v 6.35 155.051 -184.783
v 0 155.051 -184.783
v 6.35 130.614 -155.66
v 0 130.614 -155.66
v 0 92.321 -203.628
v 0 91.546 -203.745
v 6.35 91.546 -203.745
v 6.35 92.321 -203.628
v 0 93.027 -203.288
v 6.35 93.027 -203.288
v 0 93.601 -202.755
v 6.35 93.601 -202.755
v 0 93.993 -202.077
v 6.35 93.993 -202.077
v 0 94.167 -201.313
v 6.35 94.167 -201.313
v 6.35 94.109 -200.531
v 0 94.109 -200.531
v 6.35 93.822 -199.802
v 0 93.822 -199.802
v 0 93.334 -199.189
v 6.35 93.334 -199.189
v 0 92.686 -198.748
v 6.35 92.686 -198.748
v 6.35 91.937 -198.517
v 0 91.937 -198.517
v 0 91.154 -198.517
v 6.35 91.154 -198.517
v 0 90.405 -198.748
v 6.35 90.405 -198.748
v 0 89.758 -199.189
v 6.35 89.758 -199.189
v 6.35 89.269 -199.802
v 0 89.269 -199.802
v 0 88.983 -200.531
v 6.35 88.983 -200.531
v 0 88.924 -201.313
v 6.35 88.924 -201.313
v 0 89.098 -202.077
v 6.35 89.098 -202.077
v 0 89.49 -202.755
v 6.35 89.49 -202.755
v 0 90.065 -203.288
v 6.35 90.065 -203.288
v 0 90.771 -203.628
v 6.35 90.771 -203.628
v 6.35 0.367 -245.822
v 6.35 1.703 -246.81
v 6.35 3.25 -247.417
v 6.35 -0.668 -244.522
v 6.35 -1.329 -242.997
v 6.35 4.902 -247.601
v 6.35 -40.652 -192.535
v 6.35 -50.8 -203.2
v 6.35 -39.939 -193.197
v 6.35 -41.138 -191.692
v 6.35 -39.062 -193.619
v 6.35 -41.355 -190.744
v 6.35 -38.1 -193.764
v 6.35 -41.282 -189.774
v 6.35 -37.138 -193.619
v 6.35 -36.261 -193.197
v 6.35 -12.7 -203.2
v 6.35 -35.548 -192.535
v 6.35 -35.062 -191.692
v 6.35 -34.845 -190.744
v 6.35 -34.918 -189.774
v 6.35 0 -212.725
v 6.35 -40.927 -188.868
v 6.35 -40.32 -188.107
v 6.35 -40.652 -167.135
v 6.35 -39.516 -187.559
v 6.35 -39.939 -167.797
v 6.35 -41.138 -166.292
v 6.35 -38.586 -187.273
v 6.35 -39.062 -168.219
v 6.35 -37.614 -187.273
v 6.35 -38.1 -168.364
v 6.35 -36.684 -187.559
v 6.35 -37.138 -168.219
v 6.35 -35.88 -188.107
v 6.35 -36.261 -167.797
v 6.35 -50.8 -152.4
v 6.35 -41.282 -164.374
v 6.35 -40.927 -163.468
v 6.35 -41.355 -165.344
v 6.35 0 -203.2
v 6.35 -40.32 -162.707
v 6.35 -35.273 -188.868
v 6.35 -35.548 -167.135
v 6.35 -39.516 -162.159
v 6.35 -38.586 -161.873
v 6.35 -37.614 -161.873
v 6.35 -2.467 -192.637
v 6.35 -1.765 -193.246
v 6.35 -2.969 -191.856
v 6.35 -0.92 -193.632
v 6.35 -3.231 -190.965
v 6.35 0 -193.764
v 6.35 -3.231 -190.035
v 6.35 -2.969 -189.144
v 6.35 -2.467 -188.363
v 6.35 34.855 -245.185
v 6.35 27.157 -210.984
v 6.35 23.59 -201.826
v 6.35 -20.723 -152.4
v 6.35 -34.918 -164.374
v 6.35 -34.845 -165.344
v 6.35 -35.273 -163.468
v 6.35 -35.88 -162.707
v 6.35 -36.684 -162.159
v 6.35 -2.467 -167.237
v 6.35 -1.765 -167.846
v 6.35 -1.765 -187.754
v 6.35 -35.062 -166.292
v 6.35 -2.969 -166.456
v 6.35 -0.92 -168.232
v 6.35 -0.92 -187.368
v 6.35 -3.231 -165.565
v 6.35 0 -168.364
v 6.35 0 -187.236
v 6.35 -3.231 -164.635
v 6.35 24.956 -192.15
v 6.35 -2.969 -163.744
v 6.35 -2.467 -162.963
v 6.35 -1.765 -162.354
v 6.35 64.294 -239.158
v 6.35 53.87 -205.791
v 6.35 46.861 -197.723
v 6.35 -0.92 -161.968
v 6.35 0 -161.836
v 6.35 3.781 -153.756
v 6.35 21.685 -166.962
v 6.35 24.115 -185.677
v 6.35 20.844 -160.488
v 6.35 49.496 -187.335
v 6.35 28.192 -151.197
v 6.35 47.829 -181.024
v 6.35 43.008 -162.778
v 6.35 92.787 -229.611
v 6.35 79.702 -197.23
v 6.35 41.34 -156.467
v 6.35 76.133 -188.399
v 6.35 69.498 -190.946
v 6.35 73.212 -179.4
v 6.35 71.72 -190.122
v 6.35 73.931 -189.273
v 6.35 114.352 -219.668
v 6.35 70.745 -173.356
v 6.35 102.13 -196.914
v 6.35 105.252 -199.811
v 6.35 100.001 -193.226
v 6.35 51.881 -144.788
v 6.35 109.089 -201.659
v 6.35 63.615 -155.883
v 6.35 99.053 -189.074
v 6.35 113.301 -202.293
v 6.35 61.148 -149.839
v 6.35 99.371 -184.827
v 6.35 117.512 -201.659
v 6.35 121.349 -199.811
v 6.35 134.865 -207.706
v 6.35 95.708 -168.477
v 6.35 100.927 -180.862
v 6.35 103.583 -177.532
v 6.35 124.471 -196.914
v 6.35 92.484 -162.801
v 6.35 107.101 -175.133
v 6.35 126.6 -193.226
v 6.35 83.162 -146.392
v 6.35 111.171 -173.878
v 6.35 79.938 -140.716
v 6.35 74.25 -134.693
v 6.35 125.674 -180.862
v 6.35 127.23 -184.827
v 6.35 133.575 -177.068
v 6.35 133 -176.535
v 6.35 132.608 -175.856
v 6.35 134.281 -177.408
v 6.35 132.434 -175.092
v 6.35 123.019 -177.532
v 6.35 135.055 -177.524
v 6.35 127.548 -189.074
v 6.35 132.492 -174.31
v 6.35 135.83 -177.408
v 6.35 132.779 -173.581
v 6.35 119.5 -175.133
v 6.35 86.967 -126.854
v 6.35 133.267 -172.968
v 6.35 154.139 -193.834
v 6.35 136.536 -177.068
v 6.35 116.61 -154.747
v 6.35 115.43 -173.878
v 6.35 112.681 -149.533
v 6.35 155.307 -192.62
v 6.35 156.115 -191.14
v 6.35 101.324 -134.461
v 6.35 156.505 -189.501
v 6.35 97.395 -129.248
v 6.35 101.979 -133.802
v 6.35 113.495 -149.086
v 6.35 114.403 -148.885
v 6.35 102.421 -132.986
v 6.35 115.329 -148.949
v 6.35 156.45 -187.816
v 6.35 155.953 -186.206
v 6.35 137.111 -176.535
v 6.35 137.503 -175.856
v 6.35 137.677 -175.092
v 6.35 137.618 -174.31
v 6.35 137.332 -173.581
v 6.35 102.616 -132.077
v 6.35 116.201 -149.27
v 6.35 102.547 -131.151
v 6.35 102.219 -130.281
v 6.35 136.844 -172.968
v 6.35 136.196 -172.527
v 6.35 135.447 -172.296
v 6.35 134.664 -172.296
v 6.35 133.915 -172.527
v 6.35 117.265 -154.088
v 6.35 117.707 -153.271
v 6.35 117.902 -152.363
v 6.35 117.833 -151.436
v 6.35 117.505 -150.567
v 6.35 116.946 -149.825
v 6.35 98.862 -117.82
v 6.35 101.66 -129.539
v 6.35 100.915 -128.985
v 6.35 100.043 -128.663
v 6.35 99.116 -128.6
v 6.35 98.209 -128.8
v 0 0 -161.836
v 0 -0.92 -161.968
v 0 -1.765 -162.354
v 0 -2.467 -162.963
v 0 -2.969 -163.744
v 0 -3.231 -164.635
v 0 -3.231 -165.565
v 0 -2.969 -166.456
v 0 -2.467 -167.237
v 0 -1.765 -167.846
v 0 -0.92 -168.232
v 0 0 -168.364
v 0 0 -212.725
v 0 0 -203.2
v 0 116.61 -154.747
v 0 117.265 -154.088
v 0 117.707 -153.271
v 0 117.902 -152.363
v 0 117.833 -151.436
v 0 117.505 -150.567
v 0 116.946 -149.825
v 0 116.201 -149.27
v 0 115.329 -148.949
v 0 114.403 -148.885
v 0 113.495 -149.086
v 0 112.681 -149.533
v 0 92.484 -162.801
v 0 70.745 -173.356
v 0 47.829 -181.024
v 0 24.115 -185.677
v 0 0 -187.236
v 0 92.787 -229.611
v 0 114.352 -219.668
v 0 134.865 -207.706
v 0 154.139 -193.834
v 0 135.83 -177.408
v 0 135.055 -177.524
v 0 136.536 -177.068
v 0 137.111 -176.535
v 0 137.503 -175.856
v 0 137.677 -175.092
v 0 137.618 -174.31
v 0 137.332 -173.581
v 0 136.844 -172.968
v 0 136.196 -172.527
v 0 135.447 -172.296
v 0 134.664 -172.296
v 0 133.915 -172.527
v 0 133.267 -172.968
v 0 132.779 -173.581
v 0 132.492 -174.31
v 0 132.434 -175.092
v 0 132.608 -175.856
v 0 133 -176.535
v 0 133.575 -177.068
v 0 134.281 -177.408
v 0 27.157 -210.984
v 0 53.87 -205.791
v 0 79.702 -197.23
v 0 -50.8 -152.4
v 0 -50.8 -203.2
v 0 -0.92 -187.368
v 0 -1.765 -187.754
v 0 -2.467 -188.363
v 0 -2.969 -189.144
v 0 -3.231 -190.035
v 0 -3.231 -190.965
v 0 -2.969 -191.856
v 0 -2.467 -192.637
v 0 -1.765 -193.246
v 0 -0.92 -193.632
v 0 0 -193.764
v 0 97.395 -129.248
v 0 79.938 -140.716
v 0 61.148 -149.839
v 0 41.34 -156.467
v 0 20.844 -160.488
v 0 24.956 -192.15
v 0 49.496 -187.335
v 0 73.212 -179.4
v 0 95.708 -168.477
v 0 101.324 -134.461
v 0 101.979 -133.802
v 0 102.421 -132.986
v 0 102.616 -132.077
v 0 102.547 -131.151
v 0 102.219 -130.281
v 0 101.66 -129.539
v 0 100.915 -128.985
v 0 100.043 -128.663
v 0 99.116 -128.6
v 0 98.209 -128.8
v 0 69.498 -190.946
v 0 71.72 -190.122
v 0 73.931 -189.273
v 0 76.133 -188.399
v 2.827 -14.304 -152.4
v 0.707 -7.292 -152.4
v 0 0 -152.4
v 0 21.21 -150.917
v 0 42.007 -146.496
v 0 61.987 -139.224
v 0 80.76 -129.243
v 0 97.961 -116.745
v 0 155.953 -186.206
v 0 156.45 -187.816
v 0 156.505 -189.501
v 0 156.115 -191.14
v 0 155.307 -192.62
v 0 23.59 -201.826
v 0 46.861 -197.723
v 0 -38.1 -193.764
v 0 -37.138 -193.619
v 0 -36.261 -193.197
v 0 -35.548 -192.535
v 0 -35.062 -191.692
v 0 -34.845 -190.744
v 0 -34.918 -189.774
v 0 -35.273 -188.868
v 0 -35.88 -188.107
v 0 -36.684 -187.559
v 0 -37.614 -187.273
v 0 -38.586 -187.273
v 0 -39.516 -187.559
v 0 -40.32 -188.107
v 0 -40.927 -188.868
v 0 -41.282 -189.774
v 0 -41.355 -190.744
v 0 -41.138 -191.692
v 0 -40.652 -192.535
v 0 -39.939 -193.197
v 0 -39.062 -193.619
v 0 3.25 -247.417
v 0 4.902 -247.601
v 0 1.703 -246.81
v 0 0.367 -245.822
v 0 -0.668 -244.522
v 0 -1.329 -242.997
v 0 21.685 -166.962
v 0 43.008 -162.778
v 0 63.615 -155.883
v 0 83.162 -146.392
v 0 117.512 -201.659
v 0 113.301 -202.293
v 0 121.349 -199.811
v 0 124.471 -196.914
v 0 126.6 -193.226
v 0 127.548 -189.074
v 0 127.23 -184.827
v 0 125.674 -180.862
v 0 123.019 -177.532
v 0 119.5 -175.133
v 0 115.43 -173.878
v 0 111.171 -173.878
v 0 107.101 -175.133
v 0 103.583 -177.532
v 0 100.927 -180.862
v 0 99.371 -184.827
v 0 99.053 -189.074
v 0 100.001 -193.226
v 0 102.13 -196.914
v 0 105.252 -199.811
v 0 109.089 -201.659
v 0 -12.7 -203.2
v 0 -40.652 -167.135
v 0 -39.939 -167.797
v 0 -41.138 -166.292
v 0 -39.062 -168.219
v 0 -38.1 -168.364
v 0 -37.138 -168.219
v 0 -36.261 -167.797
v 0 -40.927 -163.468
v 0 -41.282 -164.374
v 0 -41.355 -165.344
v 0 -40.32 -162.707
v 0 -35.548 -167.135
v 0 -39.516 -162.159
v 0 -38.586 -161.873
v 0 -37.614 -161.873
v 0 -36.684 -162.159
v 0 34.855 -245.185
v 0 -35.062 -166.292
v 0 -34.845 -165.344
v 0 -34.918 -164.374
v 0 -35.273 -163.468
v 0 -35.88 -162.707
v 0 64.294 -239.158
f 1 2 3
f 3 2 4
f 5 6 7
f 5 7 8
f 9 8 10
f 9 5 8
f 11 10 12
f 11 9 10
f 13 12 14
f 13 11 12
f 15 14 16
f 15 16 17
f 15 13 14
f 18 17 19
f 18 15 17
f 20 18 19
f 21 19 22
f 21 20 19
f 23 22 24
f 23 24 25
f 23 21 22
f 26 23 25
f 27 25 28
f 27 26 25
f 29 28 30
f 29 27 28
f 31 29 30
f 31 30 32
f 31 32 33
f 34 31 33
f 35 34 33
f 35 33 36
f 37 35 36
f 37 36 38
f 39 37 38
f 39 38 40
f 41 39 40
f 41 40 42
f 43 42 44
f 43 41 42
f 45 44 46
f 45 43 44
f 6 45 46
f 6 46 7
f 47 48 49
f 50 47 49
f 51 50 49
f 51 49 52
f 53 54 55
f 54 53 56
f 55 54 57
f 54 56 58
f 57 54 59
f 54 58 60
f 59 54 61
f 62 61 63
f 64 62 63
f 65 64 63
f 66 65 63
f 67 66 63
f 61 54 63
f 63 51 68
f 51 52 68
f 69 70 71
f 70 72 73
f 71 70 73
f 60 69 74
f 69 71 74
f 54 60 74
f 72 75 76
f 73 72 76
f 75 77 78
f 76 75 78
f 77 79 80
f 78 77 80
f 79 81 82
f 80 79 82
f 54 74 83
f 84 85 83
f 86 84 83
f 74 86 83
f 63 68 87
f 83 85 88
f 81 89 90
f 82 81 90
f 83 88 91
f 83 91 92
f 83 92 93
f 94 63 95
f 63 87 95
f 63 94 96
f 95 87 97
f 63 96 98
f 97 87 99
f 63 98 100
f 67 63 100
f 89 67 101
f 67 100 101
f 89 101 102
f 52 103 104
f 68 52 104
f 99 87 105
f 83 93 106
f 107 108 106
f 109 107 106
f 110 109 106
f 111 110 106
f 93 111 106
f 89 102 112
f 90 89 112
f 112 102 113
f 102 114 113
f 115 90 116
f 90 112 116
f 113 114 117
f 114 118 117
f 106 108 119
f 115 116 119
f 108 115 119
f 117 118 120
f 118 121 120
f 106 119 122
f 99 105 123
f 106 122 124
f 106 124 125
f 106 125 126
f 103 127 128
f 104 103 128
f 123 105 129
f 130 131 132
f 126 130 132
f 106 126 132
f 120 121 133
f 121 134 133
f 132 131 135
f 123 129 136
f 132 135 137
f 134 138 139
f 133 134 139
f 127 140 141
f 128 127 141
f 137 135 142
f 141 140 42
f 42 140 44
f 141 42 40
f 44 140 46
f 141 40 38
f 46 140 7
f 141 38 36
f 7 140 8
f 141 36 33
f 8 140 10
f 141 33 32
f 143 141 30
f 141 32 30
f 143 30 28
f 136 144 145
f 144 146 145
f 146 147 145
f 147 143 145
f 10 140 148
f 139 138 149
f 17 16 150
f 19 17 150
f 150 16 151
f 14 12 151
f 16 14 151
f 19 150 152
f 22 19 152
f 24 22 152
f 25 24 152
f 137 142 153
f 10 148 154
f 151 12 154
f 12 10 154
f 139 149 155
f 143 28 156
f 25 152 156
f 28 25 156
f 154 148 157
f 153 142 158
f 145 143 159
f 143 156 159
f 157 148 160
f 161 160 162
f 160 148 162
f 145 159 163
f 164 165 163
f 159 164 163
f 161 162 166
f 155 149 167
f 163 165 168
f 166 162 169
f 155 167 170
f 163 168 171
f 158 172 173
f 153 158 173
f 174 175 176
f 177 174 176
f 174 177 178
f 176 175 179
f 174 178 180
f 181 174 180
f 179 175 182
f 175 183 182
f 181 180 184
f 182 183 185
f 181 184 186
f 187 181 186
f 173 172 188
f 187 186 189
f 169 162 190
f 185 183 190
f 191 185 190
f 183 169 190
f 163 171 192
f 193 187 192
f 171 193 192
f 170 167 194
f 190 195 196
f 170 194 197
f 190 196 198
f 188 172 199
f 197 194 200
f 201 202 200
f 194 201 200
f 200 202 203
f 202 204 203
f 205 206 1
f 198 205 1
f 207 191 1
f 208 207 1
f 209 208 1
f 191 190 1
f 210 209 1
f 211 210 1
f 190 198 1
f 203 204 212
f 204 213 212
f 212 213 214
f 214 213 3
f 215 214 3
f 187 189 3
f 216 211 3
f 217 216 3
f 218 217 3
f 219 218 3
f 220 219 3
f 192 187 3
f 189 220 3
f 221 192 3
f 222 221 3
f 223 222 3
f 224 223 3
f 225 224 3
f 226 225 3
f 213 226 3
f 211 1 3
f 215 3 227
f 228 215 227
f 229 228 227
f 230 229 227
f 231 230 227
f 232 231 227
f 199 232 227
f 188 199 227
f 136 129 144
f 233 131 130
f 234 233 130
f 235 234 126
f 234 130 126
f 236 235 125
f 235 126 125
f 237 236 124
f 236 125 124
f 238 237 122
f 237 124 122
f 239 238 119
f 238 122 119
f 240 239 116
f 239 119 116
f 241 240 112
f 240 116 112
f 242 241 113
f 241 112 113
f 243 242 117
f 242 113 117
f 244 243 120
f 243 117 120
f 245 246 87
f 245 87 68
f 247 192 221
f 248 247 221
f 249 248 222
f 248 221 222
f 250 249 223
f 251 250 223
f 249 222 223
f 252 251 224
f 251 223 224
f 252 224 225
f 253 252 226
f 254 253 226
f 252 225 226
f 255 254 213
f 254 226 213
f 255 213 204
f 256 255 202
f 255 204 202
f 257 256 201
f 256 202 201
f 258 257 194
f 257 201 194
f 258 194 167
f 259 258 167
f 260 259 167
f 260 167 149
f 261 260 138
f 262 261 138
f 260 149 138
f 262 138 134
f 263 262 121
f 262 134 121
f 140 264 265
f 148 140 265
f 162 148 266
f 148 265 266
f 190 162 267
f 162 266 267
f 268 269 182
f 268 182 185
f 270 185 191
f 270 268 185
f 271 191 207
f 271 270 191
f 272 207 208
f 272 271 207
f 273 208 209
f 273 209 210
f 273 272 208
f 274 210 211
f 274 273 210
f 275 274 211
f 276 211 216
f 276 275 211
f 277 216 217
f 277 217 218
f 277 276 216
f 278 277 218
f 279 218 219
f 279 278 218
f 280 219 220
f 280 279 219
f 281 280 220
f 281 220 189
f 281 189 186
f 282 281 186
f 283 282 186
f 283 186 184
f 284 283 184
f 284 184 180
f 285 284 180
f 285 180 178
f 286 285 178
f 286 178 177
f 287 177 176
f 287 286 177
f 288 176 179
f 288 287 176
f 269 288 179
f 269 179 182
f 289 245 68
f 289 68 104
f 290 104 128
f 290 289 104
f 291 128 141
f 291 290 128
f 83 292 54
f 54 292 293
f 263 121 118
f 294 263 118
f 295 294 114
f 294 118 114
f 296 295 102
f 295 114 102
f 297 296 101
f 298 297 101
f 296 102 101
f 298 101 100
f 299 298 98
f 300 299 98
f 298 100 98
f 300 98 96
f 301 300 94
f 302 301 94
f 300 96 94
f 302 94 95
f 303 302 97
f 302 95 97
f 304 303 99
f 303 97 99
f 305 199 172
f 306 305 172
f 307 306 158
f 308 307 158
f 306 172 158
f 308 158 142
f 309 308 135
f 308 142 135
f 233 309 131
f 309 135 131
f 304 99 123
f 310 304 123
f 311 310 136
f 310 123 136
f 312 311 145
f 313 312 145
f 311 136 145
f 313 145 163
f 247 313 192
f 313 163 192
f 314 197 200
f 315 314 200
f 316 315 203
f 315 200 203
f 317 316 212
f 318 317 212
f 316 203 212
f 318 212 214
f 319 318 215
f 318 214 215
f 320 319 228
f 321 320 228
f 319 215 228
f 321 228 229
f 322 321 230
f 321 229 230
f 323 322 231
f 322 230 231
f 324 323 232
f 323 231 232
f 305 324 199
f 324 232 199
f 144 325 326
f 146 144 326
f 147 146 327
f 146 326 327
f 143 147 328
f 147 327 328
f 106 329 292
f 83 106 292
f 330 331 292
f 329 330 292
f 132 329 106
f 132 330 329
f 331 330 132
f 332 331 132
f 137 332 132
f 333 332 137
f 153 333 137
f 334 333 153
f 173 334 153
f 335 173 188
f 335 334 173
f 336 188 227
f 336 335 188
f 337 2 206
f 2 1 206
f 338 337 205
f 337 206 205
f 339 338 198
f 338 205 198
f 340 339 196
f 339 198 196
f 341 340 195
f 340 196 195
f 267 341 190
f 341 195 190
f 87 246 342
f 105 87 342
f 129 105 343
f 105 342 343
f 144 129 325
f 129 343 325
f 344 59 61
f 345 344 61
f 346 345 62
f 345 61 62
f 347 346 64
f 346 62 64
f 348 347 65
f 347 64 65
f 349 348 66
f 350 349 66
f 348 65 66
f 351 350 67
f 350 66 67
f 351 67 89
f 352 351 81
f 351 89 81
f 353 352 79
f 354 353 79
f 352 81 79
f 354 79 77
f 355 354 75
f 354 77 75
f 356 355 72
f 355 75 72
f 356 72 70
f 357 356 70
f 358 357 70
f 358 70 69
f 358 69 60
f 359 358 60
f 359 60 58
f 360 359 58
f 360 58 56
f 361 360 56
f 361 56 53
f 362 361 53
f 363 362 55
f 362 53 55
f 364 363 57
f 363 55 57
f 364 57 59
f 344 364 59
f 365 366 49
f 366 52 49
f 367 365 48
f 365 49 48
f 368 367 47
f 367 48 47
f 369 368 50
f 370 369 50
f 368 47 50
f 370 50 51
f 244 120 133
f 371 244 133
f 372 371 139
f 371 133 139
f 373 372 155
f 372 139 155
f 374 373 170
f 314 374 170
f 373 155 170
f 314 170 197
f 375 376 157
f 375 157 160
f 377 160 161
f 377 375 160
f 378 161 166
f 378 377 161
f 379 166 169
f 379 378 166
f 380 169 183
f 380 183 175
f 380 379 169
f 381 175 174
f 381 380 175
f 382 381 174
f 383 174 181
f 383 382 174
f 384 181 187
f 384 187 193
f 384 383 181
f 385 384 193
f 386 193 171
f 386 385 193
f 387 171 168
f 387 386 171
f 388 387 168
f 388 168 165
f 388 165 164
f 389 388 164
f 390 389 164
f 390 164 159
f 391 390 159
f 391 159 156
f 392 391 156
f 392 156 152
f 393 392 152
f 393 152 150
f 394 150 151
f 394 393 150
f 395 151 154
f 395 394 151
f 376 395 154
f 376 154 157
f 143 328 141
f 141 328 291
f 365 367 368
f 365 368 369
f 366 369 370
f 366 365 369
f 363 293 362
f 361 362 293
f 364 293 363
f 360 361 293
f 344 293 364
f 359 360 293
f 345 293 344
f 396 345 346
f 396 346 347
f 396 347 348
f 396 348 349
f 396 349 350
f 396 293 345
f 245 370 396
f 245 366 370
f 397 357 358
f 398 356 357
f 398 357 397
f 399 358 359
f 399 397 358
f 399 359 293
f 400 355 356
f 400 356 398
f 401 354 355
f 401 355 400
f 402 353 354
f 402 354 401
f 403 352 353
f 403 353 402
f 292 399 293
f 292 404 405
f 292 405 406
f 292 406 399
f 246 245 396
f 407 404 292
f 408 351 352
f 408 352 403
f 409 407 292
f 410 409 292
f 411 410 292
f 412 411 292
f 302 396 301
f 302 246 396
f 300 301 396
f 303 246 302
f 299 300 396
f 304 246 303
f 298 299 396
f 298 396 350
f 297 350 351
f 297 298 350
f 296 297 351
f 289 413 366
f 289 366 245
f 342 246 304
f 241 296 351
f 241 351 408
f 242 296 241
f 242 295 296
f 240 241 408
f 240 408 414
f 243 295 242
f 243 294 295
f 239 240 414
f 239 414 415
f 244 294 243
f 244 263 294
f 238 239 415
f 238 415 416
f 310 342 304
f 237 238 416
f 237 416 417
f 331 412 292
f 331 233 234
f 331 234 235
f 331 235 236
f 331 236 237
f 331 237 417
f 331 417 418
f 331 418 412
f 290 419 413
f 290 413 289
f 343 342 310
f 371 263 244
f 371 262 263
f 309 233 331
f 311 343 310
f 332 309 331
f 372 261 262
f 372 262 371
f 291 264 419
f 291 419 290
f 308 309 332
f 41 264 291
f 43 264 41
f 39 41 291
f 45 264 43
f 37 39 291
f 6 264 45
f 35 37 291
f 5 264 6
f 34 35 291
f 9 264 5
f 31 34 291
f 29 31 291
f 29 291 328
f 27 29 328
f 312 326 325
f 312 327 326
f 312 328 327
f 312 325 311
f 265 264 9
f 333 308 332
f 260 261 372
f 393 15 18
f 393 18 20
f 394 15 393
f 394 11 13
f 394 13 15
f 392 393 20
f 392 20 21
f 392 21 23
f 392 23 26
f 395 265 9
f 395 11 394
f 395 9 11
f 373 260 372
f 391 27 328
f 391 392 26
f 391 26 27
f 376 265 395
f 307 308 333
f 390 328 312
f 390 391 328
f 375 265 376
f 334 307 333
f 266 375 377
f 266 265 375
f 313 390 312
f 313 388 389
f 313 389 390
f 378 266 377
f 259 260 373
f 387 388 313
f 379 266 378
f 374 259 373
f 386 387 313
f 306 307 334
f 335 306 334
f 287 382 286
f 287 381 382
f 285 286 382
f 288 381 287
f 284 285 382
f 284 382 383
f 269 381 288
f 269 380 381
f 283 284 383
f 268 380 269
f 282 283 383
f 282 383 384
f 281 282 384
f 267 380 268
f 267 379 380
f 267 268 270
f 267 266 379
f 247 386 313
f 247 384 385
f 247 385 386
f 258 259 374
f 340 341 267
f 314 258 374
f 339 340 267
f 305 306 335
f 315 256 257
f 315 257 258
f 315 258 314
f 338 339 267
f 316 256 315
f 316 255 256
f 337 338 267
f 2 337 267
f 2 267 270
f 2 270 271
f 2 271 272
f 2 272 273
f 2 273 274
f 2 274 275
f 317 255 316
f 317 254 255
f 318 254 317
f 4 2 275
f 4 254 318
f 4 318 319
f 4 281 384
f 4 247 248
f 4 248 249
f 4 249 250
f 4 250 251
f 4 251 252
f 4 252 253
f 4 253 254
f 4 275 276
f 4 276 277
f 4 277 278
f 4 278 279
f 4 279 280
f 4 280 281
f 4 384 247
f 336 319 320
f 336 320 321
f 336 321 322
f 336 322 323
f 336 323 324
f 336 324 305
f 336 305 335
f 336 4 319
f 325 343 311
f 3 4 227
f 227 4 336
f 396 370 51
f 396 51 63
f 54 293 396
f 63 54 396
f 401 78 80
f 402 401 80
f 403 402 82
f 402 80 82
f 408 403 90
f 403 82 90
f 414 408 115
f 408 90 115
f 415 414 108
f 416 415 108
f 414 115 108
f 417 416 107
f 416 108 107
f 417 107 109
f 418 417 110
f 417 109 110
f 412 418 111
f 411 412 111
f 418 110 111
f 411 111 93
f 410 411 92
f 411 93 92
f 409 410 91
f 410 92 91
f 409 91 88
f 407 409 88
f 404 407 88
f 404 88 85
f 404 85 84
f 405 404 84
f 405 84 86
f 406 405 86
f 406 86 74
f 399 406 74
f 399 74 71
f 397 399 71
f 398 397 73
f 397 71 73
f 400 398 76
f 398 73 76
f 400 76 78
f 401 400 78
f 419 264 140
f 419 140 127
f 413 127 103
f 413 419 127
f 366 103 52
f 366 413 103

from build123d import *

# Parameters (mm, degrees)
SKETCH1_R           = 14.2875
SKETCH1_R_2         = 2.6289
BOSS_EXTRUDE1_DEPTH = 6.35
CUT_EXTRUDE4_DEPTH  = 6.35
SKETCH3_R           = 3.2639
CUT_EXTRUDE5_DEPTH  = 6.35
FILLET1_R           = 6.35
BOSS_EXTRUDE2_DEPTH = 6.35
FILLET3_R           = 6.35


with BuildPart() as part:
    # Sketch1 → Boss-Extrude1 (new body)
    with BuildSketch(Plane(origin=(0, 0, 0), x_dir=(0, 0, -1), z_dir=(1, 0, 0))):
        with BuildLine():
            Line((152.4, 0), (152.4, -50.8))
            Line((152.4, -50.8), (203.2, -50.8))
            Line((203.2, -50.8), (203.2, 0))
            ThreePointArc((203.2, 0), (200.112935412, 35.285309702), (190.945540544, 69.498493124))
            ThreePointArc((190.945540544, 69.498493124), (189.701046492, 72.826869766), (188.398540476, 76.132975421))
            Line((188.398540476, 76.132975421), (229.610721205, 92.787063794))
            ThreePointArc((229.610721205, 92.787063794), (212.273109896, 127.556455404), (189.710906338, 159.186351539))
            Line((189.710906338, 159.186351539), (155.660230842, 130.614442288))
            Line((155.660230842, 130.614442288), (116.745173131, 97.960831716))
            ThreePointArc((116.745173131, 97.960831716), (143.209155408, 52.123869843), (152.4, 0))
        make_face()
        with Locations((188.005902275, 113.300555851)):
            Circle(SKETCH1_R, mode=Mode.SUBTRACT)
        with Locations((174.895446842, 135.055462386)):
            Circle(SKETCH1_R_2, mode=Mode.SUBTRACT)
        with Locations((201.116357708, 91.545649316)):
            Circle(SKETCH1_R_2, mode=Mode.SUBTRACT)
    extrude(amount=BOSS_EXTRUDE1_DEPTH)

    # Sketch2 → Cut-Extrude4 (cut)
    with BuildSketch(Plane(origin=(6.35, 0, 0), x_dir=(0, 0, -1), z_dir=(1, 0, 0))):
        with BuildLine():
            ThreePointArc((134.46138915, 101.323924376), (129.890458655, 101.966326764), (129.248056268, 97.395396268))
            ThreePointArc((129.248056268, 97.395396268), (153.473001896, 51.351348104), (161.8361, 0))
            ThreePointArc((161.8361, 0), (165.1, -3.2639), (168.3639, 0))
            ThreePointArc((168.3639, 0), (159.663469053, 53.422649441), (134.46138915, 101.323924376))
        make_face()
        with BuildLine():
            ThreePointArc((154.746731105, 116.610025965), (150.17580061, 117.252428352), (149.533398223, 112.681497856))
            ThreePointArc((149.533398223, 112.681497856), (177.560422739, 59.410886377), (187.2361, 0))
            ThreePointArc((187.2361, 0), (190.5, -3.2639), (193.7639, 0))
            ThreePointArc((193.7639, 0), (183.750889895, 61.482187713), (154.746731105, 116.610025965))
        make_face()
    extrude(amount=-CUT_EXTRUDE4_DEPTH, mode=Mode.SUBTRACT)

    # Sketch3 → Cut-Extrude5 (cut)
    with BuildSketch(Plane(origin=(6.35, 0, 0), x_dir=(0, 0, -1), z_dir=(1, 0, 0))):
        with Locations((165.1, -38.1)):
            Circle(SKETCH3_R)
        with Locations((190.5, -38.1)):
            Circle(SKETCH3_R)
    extrude(amount=-CUT_EXTRUDE5_DEPTH, mode=Mode.SUBTRACT)

    # Fillet1
    fillet1_edges = [part.edges().sort_by_distance(p)[0] for p in [
        (3.175, 159.186351539, -189.710906338),
    ]]
    fillet(fillet1_edges, radius=FILLET1_R)

    # Sketch4 → Cut-Revolve1 (revolve, cut)
    with BuildSketch(Plane(origin=(0, 0, 0), x_dir=(1, 0, 0), z_dir=(0, 1, 0))):
        with BuildLine():
            Line((-89.242743252, 38.1), (146.392743252, 38.1))
            ThreePointArc((146.392743252, 38.1), (28.575, 155.917743252), (-89.242743252, 38.1))
        make_face()
    revolve(axis=Axis((-1000, 0, 0), (1, 0, 0)), mode=Mode.SUBTRACT)

    # Sketch5 → Boss-Extrude2 (add)
    with BuildSketch(Plane.ZY):
        with BuildLine():
            Line((-197.229722061, 79.701708643), (-229.610721205, 92.787063794))
            ThreePointArc((-229.610721205, 92.787063794), (-243.09835212, 47.262180406), (-247.65, 0))
            Line((-247.65, 0), (-203.2, -12.7))
            Line((-203.2, -12.7), (-203.2, 0))
            Line((-203.2, 0), (-212.725, 0))
            ThreePointArc((-212.725, 0), (-208.81525118, 40.597001118), (-197.229722061, 79.701708643))
        make_face()
    extrude(amount=-BOSS_EXTRUDE2_DEPTH)

    # Fillet3
    fillet3_edges = [part.edges().sort_by_distance(p)[0] for p in [
        (3.175, 0, -247.65),
    ]]
    fillet(fillet3_edges, radius=FILLET3_R)


solid = part.part
